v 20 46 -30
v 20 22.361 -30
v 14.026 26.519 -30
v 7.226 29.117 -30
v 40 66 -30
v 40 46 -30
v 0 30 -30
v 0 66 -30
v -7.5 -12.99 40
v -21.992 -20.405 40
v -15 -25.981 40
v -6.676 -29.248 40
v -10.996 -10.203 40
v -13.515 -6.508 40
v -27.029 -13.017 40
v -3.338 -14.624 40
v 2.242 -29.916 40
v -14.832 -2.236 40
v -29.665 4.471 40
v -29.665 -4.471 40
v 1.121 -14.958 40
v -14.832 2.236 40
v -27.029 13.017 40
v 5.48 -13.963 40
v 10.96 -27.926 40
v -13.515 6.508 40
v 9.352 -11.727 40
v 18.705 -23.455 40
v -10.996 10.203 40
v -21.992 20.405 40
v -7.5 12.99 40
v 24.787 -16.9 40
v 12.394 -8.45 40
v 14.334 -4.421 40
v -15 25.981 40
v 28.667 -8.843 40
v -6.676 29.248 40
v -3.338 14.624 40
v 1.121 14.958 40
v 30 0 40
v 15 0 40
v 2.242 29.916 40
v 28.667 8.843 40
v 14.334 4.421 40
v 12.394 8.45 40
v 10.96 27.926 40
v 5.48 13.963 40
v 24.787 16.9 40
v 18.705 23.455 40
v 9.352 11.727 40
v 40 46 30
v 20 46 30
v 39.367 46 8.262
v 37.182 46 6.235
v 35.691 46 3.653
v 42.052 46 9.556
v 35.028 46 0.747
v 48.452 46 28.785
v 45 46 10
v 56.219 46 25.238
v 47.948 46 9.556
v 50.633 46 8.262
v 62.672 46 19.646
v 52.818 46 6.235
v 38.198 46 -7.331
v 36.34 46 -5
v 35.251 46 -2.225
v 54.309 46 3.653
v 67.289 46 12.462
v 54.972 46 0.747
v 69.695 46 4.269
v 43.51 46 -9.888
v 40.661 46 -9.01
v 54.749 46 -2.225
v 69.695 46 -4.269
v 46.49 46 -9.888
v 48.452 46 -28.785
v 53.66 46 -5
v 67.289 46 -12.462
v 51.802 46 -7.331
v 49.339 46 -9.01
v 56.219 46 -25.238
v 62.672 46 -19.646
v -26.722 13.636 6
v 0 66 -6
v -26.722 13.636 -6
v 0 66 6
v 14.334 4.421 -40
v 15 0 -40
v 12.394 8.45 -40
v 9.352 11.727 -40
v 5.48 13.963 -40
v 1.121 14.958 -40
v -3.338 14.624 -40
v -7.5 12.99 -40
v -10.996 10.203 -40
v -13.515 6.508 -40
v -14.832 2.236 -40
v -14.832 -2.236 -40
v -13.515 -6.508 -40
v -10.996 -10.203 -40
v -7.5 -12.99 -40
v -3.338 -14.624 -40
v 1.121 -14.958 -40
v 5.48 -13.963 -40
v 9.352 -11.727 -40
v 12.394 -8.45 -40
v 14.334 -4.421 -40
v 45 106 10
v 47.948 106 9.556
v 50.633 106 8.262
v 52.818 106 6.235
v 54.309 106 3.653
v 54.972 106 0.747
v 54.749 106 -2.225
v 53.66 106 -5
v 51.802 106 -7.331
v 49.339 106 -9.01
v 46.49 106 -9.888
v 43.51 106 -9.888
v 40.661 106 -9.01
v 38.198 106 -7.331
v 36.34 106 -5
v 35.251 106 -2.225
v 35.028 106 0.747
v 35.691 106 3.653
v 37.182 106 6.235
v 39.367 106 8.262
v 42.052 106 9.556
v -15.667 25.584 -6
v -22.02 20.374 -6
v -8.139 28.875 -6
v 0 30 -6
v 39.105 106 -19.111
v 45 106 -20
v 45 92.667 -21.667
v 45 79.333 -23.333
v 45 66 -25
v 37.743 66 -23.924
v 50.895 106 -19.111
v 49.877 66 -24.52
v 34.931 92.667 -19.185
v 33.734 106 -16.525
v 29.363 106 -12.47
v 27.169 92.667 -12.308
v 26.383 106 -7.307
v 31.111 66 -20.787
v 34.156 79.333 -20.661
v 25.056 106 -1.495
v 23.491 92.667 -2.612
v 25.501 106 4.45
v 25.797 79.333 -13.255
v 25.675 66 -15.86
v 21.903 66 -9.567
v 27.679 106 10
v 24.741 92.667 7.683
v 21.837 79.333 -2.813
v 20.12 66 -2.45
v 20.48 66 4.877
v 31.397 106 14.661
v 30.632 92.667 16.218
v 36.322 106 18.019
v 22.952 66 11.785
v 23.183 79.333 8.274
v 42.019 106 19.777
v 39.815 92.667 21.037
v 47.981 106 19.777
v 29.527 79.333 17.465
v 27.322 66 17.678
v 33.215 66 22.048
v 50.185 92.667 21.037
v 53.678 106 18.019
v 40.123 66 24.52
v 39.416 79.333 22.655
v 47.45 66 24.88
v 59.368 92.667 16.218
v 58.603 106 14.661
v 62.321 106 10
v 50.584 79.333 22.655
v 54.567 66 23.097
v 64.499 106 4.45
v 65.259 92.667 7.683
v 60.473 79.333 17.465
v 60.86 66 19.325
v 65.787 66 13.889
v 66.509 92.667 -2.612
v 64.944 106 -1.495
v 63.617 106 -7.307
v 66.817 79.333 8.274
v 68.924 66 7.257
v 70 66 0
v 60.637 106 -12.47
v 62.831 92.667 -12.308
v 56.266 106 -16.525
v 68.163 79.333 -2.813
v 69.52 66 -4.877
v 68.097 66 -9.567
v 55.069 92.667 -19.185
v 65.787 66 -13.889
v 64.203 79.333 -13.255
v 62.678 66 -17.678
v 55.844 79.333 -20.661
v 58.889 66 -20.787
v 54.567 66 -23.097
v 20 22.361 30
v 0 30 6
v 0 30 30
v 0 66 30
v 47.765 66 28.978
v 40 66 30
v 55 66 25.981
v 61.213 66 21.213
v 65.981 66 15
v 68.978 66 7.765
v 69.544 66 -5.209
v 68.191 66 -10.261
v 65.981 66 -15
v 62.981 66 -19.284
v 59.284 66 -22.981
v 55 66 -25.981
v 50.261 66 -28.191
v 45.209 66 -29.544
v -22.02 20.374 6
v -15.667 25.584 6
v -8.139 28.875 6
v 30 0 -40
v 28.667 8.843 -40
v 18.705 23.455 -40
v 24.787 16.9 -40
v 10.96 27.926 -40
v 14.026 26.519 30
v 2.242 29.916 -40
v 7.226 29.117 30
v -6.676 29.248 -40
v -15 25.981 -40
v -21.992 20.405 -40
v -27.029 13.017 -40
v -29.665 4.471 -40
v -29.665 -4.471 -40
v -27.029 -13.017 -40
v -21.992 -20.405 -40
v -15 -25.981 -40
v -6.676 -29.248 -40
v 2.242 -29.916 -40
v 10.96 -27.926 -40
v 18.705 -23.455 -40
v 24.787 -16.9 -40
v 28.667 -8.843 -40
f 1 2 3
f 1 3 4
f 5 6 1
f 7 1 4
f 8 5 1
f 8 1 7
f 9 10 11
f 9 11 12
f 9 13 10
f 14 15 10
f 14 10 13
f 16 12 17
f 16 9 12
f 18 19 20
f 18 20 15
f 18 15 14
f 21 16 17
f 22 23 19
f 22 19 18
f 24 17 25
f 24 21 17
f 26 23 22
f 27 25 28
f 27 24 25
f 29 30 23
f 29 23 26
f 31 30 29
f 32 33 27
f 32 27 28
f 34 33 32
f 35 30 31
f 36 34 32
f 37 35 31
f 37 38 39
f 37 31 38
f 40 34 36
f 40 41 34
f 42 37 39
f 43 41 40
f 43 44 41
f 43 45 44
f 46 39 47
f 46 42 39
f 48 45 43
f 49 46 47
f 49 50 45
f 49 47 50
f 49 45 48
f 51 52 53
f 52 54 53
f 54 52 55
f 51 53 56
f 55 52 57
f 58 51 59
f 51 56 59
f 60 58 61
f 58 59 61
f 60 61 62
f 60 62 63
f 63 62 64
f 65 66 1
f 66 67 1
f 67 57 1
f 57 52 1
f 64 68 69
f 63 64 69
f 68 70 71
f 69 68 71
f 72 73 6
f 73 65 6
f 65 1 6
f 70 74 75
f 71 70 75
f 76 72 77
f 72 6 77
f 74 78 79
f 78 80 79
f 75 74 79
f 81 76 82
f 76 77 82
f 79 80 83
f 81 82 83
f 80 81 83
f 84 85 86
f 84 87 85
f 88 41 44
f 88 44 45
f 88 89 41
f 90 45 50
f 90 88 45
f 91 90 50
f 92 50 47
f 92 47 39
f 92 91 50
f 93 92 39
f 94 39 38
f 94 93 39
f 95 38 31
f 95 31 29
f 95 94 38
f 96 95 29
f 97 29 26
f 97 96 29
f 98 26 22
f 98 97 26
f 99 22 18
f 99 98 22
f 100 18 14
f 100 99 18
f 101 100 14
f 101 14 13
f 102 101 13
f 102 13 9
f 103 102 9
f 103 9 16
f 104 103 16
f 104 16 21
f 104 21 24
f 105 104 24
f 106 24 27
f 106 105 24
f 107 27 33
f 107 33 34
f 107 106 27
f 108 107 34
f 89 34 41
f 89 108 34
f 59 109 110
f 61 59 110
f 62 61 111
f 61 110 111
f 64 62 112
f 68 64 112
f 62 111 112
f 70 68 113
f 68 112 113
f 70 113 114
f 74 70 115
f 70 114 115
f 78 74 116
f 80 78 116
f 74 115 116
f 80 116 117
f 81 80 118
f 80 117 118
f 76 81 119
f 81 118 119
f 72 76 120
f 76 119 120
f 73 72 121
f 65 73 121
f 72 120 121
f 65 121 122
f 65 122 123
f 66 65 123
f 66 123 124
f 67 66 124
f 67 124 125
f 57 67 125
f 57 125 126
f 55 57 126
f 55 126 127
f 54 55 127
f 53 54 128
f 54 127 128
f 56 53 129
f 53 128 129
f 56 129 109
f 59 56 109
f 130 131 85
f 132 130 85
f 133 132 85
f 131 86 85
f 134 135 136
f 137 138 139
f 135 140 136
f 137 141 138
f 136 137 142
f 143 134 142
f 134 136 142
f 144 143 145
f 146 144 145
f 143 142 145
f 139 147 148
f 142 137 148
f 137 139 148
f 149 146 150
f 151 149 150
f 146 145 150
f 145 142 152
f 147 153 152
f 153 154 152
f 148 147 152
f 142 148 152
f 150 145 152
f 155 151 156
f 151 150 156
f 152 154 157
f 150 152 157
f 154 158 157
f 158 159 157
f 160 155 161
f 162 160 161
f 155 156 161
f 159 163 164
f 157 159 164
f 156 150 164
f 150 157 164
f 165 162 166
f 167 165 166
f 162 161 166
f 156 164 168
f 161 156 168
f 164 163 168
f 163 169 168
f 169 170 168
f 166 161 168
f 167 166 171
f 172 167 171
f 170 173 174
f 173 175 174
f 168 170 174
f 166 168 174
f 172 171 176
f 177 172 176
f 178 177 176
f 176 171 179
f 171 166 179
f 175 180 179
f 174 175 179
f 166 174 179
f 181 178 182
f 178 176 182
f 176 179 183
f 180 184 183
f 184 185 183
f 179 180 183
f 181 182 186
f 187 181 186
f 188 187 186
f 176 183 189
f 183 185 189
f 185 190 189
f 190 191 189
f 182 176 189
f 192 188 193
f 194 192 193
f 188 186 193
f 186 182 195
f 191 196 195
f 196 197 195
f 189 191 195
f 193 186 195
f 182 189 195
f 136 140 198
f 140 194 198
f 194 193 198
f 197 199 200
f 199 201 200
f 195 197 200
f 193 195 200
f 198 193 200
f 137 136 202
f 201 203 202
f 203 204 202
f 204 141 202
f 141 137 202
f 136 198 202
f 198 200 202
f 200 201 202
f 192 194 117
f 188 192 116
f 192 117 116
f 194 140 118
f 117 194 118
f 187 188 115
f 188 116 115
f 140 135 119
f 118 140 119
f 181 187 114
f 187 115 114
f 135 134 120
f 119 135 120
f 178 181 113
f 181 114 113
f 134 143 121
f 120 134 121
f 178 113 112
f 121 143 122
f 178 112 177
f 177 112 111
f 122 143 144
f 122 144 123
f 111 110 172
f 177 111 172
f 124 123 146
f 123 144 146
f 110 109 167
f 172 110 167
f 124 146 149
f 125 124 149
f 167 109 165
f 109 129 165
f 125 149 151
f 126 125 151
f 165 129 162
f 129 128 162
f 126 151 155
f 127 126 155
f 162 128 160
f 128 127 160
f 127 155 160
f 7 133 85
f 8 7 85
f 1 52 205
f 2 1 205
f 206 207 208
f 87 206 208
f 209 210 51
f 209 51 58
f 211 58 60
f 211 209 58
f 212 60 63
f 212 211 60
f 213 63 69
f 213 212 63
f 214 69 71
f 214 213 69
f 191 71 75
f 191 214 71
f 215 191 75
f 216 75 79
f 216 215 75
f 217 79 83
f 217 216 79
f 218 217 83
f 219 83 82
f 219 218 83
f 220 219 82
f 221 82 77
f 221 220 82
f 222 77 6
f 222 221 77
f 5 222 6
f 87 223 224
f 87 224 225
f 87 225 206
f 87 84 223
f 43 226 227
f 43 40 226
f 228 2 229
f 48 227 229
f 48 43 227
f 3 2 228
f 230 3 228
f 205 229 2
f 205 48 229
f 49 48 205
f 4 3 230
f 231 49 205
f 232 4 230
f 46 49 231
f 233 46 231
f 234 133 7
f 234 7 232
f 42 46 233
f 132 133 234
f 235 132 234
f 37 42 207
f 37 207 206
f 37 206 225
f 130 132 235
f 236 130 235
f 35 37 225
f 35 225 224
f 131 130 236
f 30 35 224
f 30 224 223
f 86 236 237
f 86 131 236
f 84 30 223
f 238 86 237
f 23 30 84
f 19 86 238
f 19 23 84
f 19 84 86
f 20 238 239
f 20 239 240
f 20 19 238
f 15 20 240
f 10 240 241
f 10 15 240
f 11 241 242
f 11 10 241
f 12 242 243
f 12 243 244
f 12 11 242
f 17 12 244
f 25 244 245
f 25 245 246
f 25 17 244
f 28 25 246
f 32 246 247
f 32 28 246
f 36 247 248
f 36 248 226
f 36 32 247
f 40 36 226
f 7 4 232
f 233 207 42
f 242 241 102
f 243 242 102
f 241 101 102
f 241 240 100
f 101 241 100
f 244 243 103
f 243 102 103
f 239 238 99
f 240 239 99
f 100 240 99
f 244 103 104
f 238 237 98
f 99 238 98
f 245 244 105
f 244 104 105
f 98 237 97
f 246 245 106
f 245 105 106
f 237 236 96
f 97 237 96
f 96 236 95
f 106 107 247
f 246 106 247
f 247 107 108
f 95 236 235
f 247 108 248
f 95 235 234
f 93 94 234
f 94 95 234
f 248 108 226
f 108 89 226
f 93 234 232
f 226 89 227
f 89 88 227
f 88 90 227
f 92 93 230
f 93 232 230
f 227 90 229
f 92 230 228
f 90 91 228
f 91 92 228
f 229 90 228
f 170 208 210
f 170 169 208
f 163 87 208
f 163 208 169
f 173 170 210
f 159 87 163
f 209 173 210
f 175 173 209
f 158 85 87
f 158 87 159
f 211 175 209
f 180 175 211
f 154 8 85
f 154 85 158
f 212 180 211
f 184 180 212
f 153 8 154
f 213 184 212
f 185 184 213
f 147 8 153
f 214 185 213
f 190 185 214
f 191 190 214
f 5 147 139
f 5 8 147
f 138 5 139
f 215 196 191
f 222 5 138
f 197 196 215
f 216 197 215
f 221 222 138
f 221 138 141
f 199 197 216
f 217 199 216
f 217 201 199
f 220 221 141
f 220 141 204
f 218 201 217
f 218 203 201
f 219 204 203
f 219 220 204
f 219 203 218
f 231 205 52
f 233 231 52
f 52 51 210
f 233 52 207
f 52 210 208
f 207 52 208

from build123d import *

# Parameters (mm, degrees)
SKETCH1_R           = 30
SKETCH1_R_2         = 15
BOSS_EXTRUDE3_DEPTH = 40
BOSS_EXTRUDE4_DEPTH = 30
BOSS_EXTRUDE5_DEPTH = 20
BOSS_EXTRUDE6_DEPTH = 6
SKETCH11_R          = 10
CUT_EXTRUDE1_DEPTH  = 60


with BuildPart() as part:
    # Sketch1 → Boss-Extrude3 (new body, symmetric)
    with BuildSketch(Plane.XY):
        Circle(SKETCH1_R)
        Circle(SKETCH1_R_2, mode=Mode.SUBTRACT)
    extrude(amount=BOSS_EXTRUDE3_DEPTH, both=True)

    # Sketch4 → Boss-Extrude4 (add, symmetric)
    with BuildSketch(Plane.XY):
        with BuildLine():
            Line((0, 30), (0, 66))
            Line((0, 66), (40, 66))
            Line((40, 66), (40, 46))
            Line((40, 46), (20, 46))
            Line((20, 46), (20, 22.360679775))
            ThreePointArc((20, 22.360679775), (10.704662693, 28.025170769), (0, 30))
        make_face()
    extrude(amount=BOSS_EXTRUDE4_DEPTH, both=True)

    # Sketch5 → Boss-Extrude5 (add)
    with BuildSketch(Plane(origin=(0, 66, 0), x_dir=(1, 0, 0), z_dir=(0, 1, 0))):
        with BuildLine():
            Line((40, 30), (40, -30))
            ThreePointArc((40, -30), (70, 0), (40, 30))
        make_face()
    extrude(amount=-BOSS_EXTRUDE5_DEPTH)

    # Sketch9 → Boss-Extrude6 (add, symmetric)
    with BuildSketch(Plane.XY):
        with BuildLine():
            Line((0, 66), (-26.721706285, 13.636363636))
            ThreePointArc((-26.721706285, 13.636363636), (-15.666989036, 25.584085963), (0, 30))
            Line((0, 30), (0, 66))
        make_face()
    extrude(amount=BOSS_EXTRUDE6_DEPTH, both=True)

    # Sketch10 → Revolve1 (revolve)
    with BuildSketch(Plane.XY, mode=Mode.PRIVATE) as revolve1_sk:
        Polygon((20, 66), (45, 66), (45, 106), (25, 106), align=None)
    revolve(revolve1_sk.sketch.rotate(Axis((45, 66, 0), (0, 1, 0)), 270), axis=Axis((45, 66, 0), (0, 1, 0)))  # turned: the seam where the file's is

    # Sketch11 → Cut-Extrude1 (cut)
    with BuildSketch(Plane(origin=(0, 106, 0), x_dir=(1, 0, 0), z_dir=(0, 1, 0))):
        with Locations(Location((45, 0, 0), (0, 0, 270))):  # turned: the seam where the file's is
            Circle(SKETCH11_R)
    extrude(amount=-CUT_EXTRUDE1_DEPTH, mode=Mode.SUBTRACT)


solid = part.part
